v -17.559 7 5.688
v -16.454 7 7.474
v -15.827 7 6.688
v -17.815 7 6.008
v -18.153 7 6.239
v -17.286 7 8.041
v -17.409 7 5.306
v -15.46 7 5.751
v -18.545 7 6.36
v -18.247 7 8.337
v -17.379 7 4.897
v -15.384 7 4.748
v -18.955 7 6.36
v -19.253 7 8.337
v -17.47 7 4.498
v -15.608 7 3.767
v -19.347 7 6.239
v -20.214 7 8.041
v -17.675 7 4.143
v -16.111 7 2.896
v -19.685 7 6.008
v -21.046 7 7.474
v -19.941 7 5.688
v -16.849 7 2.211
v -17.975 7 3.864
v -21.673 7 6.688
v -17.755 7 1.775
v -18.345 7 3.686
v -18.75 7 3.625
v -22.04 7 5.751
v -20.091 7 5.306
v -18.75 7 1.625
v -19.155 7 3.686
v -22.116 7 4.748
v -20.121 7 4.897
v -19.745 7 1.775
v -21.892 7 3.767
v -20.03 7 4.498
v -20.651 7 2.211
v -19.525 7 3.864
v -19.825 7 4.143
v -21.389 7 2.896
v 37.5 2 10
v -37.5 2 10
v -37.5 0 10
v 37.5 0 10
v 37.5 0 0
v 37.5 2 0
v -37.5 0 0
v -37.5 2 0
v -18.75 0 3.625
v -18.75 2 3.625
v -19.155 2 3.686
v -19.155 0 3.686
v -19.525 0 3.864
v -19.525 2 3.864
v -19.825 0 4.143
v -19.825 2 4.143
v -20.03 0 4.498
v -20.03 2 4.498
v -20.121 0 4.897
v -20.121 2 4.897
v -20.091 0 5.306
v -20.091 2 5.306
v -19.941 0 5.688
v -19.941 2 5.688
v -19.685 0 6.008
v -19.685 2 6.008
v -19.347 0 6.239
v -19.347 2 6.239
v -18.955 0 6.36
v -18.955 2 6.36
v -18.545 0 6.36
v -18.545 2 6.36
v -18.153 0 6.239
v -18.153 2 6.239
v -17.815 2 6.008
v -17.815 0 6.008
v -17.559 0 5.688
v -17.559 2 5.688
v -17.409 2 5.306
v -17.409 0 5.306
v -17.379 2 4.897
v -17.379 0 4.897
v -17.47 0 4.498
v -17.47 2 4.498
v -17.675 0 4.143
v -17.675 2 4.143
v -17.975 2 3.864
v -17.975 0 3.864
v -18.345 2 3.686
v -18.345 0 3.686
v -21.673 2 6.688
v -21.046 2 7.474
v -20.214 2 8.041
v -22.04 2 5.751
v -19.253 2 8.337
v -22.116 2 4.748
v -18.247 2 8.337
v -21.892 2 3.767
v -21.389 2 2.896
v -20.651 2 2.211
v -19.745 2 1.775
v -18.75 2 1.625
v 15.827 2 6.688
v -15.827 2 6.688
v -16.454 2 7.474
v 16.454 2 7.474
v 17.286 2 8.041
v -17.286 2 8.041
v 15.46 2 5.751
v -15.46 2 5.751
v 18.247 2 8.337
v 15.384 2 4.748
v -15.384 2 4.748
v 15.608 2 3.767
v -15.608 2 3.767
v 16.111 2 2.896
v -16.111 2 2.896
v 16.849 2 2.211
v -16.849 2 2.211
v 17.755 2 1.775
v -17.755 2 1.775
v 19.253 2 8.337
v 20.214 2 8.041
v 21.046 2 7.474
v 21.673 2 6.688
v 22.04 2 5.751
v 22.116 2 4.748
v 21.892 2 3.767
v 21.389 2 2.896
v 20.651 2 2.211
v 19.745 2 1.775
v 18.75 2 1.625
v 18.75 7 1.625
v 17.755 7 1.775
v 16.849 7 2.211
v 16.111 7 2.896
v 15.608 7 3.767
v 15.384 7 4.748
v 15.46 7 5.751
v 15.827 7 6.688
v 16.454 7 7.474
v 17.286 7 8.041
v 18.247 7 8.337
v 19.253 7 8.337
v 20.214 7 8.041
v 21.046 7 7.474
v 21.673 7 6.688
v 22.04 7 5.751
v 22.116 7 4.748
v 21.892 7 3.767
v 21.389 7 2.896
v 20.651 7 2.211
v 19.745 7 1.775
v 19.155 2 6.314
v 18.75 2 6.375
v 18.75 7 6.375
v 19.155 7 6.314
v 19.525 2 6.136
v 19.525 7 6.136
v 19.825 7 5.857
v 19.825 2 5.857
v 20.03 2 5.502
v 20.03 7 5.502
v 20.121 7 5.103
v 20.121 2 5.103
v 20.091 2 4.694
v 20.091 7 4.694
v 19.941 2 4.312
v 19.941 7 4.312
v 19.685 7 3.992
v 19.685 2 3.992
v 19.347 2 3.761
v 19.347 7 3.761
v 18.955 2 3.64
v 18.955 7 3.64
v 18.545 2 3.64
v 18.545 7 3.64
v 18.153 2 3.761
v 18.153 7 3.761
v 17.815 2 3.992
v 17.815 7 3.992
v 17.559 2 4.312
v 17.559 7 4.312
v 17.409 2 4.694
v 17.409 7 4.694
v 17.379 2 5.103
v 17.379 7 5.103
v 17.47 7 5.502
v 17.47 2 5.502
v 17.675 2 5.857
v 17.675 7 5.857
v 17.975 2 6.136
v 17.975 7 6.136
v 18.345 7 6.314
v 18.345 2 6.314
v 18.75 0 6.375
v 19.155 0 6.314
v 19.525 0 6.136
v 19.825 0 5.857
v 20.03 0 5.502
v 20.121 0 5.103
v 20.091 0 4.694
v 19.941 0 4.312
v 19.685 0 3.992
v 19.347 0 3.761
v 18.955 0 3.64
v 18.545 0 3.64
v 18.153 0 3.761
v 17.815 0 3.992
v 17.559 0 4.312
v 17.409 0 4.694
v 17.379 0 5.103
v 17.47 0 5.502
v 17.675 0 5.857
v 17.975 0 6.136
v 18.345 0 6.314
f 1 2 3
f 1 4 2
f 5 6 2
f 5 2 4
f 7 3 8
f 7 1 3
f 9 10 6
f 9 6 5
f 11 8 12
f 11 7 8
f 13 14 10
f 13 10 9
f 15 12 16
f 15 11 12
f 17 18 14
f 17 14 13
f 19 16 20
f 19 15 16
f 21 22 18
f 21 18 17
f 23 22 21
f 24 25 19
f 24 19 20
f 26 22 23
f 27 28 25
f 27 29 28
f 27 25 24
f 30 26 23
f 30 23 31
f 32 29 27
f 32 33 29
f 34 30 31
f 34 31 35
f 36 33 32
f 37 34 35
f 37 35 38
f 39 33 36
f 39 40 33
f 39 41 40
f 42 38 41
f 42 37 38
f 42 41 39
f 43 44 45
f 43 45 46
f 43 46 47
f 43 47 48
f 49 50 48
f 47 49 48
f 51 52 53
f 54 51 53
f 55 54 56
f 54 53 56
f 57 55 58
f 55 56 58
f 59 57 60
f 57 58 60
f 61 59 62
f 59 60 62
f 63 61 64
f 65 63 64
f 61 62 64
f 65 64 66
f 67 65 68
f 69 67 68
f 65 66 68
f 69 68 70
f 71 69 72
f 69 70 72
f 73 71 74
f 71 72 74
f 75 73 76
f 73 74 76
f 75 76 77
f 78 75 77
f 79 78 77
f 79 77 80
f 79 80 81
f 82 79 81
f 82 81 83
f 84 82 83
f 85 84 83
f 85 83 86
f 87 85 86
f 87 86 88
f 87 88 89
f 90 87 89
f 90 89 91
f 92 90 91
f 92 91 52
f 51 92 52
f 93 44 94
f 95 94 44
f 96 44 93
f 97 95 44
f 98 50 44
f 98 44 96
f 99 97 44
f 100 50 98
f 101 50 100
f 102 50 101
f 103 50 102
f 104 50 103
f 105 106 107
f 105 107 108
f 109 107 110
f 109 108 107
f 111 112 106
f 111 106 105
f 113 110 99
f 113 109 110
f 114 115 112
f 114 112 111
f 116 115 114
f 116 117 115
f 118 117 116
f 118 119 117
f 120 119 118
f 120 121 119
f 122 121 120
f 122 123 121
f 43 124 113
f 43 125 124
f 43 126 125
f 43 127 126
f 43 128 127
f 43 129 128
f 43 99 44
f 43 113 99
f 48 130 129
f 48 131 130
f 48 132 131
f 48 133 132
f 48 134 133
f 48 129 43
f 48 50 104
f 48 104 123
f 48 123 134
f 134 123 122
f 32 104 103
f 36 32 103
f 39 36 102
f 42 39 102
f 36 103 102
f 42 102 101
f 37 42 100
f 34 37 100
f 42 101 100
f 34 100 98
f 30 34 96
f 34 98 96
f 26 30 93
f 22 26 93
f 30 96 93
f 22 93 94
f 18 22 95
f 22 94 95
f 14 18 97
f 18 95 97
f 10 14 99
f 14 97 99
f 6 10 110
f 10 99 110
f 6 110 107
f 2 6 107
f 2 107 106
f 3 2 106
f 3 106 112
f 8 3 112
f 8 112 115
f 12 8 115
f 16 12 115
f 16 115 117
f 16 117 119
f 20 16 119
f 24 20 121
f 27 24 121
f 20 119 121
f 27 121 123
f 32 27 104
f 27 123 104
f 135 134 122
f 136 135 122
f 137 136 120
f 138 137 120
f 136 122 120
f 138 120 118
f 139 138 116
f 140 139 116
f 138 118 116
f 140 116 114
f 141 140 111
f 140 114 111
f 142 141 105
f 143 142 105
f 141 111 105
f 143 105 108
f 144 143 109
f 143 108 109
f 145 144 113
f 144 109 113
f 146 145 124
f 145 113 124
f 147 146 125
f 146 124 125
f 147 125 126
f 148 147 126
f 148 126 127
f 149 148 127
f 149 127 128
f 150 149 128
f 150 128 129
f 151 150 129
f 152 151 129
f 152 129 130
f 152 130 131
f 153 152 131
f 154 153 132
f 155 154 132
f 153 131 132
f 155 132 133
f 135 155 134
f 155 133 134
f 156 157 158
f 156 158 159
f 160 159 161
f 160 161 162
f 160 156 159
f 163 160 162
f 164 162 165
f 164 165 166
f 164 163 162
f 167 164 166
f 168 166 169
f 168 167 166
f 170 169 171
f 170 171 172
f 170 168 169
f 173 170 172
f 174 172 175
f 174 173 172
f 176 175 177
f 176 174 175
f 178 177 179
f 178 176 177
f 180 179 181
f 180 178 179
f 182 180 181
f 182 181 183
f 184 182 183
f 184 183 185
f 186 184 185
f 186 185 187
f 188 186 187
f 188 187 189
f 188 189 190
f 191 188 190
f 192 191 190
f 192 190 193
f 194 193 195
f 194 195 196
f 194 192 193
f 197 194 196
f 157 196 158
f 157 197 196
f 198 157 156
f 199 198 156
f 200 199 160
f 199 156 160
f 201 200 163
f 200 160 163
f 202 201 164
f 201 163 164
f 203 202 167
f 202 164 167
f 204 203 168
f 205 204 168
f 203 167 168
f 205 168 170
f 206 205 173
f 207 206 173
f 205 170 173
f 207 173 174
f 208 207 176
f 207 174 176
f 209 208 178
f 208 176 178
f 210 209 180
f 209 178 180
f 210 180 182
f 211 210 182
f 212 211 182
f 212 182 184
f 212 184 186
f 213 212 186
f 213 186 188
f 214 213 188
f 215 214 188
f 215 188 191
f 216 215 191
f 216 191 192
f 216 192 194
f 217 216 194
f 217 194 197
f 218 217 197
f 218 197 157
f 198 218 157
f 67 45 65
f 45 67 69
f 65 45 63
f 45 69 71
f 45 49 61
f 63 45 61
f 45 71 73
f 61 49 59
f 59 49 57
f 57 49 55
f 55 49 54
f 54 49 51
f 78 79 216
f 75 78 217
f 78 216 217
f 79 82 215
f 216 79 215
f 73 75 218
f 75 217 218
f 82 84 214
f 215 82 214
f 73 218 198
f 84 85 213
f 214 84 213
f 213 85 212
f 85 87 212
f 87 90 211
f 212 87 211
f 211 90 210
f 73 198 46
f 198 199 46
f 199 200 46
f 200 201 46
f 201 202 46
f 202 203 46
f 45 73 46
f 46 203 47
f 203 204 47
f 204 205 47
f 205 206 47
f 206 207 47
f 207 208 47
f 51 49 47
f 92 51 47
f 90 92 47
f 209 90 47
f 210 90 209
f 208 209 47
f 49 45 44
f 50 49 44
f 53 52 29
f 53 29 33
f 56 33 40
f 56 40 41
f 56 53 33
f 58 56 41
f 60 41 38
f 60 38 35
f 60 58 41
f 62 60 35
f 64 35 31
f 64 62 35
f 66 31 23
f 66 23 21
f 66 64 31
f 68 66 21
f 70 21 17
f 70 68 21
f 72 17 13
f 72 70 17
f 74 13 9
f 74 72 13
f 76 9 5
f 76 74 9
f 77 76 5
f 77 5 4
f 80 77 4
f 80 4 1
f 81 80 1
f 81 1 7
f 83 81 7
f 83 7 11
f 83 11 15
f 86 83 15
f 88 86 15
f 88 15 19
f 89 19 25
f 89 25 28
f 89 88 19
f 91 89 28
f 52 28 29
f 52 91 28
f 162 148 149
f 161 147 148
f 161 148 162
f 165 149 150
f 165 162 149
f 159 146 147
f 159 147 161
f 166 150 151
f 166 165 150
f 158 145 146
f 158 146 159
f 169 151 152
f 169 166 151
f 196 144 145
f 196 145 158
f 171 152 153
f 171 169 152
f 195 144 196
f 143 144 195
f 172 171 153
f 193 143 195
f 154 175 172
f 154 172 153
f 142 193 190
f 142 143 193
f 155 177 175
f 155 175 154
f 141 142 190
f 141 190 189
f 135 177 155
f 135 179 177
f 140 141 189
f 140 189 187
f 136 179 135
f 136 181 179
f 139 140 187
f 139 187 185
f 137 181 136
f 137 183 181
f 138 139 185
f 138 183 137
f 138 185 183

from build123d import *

# Parameters (mm, degrees)
SKETCH1_W           = 75
SKETCH1_H           = 2
BOSS_EXTRUDE1_DEPTH = 10
SKETCH2_R           = 3.375
SKETCH2_R_2         = 1.375
BOSS_EXTRUDE2_DEPTH = 5
SKETCH3_R           = 1.375
CUT_EXTRUDE1_DEPTH  = 40.131189606


with BuildPart() as part:
    # Sketch1 → Boss-Extrude1 (new body)
    with BuildSketch(Plane.XY):
        with Locations((0, 1)):
            Rectangle(SKETCH1_W, SKETCH1_H)
    extrude(amount=BOSS_EXTRUDE1_DEPTH)

    # Sketch2 → Boss-Extrude2 (add)
    # profile 1 of 2: a face of its own
    with BuildSketch(Plane(origin=(0, 2, 0), x_dir=(1, 0, 0), z_dir=(0, 1, 0))):
        with Locations(Location((18.75, -5, 0), (0, 0, 90))):
            Circle(SKETCH2_R)
        with Locations(Location((18.75, -5, 0), (0, 0, 270))):
            Circle(SKETCH2_R_2, mode=Mode.SUBTRACT)
    # profile 2 of 2: a face of its own
    with BuildSketch(Plane(origin=(0, 2, 0), x_dir=(1, 0, 0), z_dir=(0, 1, 0))):
        with Locations(Location((-18.75, -5, 0), (0, 0, 90))):
            Circle(SKETCH2_R)
        with Locations(Location((-18.75, -5, 0), (0, 0, 90))):
            Circle(SKETCH2_R_2, mode=Mode.SUBTRACT)
    extrude(amount=BOSS_EXTRUDE2_DEPTH)

    # Sketch3 → Cut-Extrude1 (cut, through all)
    with BuildSketch(Plane(origin=(0, 2, 0), x_dir=(1, 0, 0), z_dir=(0, 1, 0))):
        with Locations(Location((18.75, -5, 0), (0, 0, 270))):
            Circle(SKETCH3_R)
        with Locations(Location((-18.75, -5, 0), (0, 0, 90))):
            Circle(SKETCH3_R)
    extrude(amount=-CUT_EXTRUDE1_DEPTH, mode=Mode.SUBTRACT)


solid = part.part
